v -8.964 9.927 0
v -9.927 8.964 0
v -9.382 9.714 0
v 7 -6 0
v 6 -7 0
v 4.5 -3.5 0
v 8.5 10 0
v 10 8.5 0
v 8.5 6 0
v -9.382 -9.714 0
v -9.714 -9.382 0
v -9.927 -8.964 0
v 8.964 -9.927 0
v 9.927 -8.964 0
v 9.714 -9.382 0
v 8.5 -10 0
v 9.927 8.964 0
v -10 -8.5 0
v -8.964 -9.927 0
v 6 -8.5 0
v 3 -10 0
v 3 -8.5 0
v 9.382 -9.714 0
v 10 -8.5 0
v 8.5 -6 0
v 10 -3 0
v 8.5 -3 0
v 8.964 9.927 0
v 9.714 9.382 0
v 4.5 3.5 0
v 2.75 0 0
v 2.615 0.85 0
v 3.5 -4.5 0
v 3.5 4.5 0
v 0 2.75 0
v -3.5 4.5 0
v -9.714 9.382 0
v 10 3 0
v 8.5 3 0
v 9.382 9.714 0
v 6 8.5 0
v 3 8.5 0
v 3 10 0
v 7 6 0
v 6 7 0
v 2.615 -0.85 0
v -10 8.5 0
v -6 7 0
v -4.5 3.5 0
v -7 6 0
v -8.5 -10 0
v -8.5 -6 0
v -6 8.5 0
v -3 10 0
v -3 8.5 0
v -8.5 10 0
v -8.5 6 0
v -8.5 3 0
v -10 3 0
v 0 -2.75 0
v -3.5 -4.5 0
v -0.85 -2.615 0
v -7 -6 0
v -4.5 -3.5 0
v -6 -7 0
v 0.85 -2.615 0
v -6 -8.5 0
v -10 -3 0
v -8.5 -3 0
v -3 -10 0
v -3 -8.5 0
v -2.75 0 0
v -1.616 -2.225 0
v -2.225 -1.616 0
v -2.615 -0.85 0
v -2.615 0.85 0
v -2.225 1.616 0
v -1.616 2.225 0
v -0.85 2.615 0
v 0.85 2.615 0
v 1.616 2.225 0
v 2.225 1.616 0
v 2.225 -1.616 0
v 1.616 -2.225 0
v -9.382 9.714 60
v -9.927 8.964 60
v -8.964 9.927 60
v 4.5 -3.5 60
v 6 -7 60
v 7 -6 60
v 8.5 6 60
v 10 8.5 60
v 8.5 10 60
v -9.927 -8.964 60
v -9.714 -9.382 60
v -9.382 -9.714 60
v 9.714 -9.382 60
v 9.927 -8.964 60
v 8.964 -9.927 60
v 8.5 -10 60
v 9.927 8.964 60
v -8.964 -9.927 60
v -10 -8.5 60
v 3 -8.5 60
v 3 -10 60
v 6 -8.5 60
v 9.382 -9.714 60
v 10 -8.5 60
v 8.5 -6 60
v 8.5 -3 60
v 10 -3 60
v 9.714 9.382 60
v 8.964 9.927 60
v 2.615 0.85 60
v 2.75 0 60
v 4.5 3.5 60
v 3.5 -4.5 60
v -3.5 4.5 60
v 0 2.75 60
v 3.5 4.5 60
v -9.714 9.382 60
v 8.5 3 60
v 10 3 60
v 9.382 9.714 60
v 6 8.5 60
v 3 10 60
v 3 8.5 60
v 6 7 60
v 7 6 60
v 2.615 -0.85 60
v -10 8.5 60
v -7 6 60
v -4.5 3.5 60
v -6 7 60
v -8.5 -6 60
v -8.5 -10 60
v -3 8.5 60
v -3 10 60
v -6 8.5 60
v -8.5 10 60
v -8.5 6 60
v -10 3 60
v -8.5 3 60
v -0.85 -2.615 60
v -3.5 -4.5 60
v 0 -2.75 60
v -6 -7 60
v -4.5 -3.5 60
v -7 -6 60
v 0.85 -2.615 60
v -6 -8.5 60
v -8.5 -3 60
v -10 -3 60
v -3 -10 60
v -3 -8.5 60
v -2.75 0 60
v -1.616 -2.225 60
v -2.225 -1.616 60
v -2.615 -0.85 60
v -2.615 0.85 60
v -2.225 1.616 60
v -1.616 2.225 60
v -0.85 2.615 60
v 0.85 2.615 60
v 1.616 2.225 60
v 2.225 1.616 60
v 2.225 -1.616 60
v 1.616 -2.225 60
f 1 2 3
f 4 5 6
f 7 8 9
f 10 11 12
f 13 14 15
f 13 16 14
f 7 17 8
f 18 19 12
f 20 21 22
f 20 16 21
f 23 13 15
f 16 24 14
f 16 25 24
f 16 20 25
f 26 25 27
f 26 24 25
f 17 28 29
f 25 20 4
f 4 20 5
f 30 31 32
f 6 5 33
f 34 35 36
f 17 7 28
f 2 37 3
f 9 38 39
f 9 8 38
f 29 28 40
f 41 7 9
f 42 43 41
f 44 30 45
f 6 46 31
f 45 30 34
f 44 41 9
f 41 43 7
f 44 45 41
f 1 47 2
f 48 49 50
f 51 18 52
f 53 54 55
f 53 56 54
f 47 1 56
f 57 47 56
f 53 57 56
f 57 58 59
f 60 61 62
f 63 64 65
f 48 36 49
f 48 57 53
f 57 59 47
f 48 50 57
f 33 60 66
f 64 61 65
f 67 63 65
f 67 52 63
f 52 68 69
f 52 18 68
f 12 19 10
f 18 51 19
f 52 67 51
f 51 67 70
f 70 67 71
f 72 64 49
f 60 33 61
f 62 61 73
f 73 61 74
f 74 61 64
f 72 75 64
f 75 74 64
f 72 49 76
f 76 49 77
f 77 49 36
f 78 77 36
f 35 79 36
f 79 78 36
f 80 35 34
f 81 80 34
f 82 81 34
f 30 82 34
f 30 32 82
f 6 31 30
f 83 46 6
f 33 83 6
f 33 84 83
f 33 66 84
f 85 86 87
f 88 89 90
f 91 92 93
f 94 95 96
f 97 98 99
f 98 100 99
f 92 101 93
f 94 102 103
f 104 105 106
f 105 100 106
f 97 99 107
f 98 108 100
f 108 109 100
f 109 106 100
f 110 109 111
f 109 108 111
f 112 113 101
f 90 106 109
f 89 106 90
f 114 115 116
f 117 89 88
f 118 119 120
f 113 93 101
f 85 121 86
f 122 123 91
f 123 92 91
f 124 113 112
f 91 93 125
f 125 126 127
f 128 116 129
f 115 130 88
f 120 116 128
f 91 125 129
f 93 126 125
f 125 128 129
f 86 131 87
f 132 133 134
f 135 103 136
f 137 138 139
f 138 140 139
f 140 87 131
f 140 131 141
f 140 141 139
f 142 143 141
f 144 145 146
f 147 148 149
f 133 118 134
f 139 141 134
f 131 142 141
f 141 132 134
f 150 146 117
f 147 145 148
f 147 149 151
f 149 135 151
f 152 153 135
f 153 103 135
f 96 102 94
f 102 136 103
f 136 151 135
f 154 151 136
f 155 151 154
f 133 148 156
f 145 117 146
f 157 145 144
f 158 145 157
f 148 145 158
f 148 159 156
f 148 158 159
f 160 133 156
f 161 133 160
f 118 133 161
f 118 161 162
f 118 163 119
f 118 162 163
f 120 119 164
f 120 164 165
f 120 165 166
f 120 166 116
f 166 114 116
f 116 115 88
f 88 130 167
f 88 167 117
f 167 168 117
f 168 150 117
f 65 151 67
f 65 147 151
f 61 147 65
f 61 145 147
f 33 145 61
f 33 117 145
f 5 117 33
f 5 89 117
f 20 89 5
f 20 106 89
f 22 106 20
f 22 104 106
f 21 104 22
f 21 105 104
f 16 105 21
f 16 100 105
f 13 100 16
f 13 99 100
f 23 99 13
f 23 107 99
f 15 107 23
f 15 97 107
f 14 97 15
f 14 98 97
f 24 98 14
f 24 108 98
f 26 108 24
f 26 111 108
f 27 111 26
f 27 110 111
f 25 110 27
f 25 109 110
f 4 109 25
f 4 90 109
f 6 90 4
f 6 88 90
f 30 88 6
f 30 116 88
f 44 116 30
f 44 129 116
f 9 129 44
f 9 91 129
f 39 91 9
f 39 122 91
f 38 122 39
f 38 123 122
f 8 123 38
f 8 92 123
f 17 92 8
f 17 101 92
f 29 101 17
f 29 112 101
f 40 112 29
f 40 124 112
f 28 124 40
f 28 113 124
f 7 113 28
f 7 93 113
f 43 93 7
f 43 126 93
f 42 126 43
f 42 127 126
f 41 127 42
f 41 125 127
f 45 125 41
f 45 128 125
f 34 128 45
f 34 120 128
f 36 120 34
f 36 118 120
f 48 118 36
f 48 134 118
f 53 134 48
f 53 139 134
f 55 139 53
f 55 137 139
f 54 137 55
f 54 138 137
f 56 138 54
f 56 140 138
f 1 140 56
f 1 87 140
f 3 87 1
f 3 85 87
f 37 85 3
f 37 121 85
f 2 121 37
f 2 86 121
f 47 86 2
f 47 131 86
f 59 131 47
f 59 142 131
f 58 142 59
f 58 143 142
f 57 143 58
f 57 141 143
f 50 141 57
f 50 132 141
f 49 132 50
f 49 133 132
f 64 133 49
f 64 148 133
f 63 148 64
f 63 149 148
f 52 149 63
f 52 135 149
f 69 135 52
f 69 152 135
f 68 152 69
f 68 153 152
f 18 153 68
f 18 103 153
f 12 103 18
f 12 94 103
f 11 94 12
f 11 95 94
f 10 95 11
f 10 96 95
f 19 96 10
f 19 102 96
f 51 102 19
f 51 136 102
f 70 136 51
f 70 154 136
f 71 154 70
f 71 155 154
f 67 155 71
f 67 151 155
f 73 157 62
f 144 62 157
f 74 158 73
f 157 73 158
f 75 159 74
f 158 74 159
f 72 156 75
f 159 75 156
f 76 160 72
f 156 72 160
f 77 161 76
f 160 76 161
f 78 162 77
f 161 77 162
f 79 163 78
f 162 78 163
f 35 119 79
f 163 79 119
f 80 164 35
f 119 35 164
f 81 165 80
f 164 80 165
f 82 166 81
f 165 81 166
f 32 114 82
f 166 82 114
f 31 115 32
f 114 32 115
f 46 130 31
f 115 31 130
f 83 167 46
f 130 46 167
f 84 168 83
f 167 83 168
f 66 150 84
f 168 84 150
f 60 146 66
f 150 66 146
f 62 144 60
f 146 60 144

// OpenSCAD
$fn = 20;

color([0.8, 0.8, 0.8]) profile();

module profile() {
	linear_extrude(height = 60, convexity = 10)
	difference() {
		translate([-8.5, -8.5, 0]) {
			minkowski() {
				square([17, 17]);
				circle(1.5);
			}
		}
		for (i = [0:3]) {
			rotate(i * 90)
			polygon([	[-3, -10], [-3, -8.5], [-6, -8.5], [-6, -7], [-3.5, -4.5], 
						[3.5, -4.5], [6, -7], [6, -8.5], [3, -8.5], [3, -10]	]);
		}
		circle(2.75);
	}
}
